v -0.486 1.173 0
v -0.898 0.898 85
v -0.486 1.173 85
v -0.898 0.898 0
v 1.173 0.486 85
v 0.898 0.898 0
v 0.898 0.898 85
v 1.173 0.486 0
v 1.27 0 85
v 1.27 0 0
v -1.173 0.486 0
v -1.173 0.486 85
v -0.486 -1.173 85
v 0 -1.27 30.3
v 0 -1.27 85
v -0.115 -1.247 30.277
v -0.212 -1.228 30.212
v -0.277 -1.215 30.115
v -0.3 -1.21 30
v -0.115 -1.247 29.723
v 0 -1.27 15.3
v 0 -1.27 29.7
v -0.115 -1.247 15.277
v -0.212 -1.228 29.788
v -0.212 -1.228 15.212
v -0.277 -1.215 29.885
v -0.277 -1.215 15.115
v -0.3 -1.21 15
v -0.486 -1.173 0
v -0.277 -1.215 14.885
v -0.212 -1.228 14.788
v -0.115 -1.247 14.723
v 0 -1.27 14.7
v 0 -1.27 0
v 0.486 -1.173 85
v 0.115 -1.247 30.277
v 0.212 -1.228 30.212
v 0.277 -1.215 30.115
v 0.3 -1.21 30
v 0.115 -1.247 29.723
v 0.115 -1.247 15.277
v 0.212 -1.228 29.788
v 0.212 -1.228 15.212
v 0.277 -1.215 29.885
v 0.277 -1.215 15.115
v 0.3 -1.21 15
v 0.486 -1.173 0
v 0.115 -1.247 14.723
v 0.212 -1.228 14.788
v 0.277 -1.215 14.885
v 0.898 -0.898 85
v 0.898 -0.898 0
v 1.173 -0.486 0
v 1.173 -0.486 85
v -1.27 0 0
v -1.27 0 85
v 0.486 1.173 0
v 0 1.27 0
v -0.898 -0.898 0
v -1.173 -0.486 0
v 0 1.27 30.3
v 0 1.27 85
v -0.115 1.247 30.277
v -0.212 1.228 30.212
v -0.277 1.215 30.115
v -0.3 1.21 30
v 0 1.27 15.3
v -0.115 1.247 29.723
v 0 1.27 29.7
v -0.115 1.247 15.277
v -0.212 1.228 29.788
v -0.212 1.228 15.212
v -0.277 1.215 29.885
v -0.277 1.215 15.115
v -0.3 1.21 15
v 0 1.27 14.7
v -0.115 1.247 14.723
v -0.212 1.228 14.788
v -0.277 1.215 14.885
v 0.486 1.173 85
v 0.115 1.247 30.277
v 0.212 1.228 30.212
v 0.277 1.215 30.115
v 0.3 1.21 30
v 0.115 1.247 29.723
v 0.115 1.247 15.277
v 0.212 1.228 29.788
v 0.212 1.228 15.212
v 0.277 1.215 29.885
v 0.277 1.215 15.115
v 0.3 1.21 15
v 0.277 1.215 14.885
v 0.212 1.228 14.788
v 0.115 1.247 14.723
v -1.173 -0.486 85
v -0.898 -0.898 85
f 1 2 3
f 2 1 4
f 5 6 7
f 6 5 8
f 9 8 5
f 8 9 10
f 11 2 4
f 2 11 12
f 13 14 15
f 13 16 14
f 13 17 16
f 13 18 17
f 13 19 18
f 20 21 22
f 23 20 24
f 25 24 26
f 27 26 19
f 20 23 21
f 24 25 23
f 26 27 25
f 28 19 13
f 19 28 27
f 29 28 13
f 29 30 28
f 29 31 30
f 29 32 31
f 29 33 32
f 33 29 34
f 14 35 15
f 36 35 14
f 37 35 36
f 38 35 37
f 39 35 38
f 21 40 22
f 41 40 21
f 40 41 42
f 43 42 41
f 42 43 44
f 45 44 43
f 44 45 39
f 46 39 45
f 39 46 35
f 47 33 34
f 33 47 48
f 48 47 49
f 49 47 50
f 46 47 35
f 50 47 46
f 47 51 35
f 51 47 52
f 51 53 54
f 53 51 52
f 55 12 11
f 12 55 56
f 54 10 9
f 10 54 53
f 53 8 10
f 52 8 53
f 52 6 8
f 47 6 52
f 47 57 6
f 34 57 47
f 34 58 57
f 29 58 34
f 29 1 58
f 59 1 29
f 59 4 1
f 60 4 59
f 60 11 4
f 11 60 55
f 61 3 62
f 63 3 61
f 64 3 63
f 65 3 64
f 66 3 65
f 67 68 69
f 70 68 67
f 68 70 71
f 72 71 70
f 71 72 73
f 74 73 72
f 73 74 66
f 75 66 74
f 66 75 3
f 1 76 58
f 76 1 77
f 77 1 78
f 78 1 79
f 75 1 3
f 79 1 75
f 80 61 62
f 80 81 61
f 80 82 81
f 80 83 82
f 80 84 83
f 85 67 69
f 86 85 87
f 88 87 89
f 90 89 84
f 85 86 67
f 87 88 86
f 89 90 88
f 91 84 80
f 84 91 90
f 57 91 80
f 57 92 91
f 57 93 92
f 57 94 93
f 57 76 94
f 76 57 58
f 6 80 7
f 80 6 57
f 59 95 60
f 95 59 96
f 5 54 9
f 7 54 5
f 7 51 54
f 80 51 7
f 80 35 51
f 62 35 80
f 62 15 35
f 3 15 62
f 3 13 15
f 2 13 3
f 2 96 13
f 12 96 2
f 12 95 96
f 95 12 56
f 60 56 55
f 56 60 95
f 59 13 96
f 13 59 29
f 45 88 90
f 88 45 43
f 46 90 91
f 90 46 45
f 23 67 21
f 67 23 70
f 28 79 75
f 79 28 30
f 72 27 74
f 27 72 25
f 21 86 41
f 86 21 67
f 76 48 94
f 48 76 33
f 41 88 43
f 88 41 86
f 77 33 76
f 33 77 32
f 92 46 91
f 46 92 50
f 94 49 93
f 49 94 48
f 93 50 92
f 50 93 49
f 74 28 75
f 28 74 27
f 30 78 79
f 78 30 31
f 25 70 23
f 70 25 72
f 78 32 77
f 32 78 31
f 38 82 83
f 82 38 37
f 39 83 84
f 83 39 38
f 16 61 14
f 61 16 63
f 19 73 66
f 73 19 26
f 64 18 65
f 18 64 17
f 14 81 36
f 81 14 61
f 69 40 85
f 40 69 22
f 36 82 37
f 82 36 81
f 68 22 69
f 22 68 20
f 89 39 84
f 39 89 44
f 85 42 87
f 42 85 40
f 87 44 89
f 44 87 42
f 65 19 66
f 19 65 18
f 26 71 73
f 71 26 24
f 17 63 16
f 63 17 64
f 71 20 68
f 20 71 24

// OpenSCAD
module pipe(pipe_length = 85, pipe_diam=2.54, first_shelf_y = 15, second_shelf_y = 30)
{
    bolt_hole_diam = 0.6;
    
    difference()
    {
        translate([0, 0, pipe_length/2])
        color([0.23,0.12,0.10, 1.0])
        cylinder(h=pipe_length,r=pipe_diam/2,center = true, $fn = 16);

        translate([0,0, first_shelf_y])
        rotate([90,0,0])
        cylinder(h=pipe_diam+1.0,r=bolt_hole_diam/2,center = true, $fn = 16);
        
        if (second_shelf_y > 0) {
            translate([0,0, second_shelf_y])
            rotate([90,0,0])
            cylinder(h=pipe_diam+1.0,r=bolt_hole_diam/2,center = true, $fn = 16);
        }
    }
}   

pipe();
